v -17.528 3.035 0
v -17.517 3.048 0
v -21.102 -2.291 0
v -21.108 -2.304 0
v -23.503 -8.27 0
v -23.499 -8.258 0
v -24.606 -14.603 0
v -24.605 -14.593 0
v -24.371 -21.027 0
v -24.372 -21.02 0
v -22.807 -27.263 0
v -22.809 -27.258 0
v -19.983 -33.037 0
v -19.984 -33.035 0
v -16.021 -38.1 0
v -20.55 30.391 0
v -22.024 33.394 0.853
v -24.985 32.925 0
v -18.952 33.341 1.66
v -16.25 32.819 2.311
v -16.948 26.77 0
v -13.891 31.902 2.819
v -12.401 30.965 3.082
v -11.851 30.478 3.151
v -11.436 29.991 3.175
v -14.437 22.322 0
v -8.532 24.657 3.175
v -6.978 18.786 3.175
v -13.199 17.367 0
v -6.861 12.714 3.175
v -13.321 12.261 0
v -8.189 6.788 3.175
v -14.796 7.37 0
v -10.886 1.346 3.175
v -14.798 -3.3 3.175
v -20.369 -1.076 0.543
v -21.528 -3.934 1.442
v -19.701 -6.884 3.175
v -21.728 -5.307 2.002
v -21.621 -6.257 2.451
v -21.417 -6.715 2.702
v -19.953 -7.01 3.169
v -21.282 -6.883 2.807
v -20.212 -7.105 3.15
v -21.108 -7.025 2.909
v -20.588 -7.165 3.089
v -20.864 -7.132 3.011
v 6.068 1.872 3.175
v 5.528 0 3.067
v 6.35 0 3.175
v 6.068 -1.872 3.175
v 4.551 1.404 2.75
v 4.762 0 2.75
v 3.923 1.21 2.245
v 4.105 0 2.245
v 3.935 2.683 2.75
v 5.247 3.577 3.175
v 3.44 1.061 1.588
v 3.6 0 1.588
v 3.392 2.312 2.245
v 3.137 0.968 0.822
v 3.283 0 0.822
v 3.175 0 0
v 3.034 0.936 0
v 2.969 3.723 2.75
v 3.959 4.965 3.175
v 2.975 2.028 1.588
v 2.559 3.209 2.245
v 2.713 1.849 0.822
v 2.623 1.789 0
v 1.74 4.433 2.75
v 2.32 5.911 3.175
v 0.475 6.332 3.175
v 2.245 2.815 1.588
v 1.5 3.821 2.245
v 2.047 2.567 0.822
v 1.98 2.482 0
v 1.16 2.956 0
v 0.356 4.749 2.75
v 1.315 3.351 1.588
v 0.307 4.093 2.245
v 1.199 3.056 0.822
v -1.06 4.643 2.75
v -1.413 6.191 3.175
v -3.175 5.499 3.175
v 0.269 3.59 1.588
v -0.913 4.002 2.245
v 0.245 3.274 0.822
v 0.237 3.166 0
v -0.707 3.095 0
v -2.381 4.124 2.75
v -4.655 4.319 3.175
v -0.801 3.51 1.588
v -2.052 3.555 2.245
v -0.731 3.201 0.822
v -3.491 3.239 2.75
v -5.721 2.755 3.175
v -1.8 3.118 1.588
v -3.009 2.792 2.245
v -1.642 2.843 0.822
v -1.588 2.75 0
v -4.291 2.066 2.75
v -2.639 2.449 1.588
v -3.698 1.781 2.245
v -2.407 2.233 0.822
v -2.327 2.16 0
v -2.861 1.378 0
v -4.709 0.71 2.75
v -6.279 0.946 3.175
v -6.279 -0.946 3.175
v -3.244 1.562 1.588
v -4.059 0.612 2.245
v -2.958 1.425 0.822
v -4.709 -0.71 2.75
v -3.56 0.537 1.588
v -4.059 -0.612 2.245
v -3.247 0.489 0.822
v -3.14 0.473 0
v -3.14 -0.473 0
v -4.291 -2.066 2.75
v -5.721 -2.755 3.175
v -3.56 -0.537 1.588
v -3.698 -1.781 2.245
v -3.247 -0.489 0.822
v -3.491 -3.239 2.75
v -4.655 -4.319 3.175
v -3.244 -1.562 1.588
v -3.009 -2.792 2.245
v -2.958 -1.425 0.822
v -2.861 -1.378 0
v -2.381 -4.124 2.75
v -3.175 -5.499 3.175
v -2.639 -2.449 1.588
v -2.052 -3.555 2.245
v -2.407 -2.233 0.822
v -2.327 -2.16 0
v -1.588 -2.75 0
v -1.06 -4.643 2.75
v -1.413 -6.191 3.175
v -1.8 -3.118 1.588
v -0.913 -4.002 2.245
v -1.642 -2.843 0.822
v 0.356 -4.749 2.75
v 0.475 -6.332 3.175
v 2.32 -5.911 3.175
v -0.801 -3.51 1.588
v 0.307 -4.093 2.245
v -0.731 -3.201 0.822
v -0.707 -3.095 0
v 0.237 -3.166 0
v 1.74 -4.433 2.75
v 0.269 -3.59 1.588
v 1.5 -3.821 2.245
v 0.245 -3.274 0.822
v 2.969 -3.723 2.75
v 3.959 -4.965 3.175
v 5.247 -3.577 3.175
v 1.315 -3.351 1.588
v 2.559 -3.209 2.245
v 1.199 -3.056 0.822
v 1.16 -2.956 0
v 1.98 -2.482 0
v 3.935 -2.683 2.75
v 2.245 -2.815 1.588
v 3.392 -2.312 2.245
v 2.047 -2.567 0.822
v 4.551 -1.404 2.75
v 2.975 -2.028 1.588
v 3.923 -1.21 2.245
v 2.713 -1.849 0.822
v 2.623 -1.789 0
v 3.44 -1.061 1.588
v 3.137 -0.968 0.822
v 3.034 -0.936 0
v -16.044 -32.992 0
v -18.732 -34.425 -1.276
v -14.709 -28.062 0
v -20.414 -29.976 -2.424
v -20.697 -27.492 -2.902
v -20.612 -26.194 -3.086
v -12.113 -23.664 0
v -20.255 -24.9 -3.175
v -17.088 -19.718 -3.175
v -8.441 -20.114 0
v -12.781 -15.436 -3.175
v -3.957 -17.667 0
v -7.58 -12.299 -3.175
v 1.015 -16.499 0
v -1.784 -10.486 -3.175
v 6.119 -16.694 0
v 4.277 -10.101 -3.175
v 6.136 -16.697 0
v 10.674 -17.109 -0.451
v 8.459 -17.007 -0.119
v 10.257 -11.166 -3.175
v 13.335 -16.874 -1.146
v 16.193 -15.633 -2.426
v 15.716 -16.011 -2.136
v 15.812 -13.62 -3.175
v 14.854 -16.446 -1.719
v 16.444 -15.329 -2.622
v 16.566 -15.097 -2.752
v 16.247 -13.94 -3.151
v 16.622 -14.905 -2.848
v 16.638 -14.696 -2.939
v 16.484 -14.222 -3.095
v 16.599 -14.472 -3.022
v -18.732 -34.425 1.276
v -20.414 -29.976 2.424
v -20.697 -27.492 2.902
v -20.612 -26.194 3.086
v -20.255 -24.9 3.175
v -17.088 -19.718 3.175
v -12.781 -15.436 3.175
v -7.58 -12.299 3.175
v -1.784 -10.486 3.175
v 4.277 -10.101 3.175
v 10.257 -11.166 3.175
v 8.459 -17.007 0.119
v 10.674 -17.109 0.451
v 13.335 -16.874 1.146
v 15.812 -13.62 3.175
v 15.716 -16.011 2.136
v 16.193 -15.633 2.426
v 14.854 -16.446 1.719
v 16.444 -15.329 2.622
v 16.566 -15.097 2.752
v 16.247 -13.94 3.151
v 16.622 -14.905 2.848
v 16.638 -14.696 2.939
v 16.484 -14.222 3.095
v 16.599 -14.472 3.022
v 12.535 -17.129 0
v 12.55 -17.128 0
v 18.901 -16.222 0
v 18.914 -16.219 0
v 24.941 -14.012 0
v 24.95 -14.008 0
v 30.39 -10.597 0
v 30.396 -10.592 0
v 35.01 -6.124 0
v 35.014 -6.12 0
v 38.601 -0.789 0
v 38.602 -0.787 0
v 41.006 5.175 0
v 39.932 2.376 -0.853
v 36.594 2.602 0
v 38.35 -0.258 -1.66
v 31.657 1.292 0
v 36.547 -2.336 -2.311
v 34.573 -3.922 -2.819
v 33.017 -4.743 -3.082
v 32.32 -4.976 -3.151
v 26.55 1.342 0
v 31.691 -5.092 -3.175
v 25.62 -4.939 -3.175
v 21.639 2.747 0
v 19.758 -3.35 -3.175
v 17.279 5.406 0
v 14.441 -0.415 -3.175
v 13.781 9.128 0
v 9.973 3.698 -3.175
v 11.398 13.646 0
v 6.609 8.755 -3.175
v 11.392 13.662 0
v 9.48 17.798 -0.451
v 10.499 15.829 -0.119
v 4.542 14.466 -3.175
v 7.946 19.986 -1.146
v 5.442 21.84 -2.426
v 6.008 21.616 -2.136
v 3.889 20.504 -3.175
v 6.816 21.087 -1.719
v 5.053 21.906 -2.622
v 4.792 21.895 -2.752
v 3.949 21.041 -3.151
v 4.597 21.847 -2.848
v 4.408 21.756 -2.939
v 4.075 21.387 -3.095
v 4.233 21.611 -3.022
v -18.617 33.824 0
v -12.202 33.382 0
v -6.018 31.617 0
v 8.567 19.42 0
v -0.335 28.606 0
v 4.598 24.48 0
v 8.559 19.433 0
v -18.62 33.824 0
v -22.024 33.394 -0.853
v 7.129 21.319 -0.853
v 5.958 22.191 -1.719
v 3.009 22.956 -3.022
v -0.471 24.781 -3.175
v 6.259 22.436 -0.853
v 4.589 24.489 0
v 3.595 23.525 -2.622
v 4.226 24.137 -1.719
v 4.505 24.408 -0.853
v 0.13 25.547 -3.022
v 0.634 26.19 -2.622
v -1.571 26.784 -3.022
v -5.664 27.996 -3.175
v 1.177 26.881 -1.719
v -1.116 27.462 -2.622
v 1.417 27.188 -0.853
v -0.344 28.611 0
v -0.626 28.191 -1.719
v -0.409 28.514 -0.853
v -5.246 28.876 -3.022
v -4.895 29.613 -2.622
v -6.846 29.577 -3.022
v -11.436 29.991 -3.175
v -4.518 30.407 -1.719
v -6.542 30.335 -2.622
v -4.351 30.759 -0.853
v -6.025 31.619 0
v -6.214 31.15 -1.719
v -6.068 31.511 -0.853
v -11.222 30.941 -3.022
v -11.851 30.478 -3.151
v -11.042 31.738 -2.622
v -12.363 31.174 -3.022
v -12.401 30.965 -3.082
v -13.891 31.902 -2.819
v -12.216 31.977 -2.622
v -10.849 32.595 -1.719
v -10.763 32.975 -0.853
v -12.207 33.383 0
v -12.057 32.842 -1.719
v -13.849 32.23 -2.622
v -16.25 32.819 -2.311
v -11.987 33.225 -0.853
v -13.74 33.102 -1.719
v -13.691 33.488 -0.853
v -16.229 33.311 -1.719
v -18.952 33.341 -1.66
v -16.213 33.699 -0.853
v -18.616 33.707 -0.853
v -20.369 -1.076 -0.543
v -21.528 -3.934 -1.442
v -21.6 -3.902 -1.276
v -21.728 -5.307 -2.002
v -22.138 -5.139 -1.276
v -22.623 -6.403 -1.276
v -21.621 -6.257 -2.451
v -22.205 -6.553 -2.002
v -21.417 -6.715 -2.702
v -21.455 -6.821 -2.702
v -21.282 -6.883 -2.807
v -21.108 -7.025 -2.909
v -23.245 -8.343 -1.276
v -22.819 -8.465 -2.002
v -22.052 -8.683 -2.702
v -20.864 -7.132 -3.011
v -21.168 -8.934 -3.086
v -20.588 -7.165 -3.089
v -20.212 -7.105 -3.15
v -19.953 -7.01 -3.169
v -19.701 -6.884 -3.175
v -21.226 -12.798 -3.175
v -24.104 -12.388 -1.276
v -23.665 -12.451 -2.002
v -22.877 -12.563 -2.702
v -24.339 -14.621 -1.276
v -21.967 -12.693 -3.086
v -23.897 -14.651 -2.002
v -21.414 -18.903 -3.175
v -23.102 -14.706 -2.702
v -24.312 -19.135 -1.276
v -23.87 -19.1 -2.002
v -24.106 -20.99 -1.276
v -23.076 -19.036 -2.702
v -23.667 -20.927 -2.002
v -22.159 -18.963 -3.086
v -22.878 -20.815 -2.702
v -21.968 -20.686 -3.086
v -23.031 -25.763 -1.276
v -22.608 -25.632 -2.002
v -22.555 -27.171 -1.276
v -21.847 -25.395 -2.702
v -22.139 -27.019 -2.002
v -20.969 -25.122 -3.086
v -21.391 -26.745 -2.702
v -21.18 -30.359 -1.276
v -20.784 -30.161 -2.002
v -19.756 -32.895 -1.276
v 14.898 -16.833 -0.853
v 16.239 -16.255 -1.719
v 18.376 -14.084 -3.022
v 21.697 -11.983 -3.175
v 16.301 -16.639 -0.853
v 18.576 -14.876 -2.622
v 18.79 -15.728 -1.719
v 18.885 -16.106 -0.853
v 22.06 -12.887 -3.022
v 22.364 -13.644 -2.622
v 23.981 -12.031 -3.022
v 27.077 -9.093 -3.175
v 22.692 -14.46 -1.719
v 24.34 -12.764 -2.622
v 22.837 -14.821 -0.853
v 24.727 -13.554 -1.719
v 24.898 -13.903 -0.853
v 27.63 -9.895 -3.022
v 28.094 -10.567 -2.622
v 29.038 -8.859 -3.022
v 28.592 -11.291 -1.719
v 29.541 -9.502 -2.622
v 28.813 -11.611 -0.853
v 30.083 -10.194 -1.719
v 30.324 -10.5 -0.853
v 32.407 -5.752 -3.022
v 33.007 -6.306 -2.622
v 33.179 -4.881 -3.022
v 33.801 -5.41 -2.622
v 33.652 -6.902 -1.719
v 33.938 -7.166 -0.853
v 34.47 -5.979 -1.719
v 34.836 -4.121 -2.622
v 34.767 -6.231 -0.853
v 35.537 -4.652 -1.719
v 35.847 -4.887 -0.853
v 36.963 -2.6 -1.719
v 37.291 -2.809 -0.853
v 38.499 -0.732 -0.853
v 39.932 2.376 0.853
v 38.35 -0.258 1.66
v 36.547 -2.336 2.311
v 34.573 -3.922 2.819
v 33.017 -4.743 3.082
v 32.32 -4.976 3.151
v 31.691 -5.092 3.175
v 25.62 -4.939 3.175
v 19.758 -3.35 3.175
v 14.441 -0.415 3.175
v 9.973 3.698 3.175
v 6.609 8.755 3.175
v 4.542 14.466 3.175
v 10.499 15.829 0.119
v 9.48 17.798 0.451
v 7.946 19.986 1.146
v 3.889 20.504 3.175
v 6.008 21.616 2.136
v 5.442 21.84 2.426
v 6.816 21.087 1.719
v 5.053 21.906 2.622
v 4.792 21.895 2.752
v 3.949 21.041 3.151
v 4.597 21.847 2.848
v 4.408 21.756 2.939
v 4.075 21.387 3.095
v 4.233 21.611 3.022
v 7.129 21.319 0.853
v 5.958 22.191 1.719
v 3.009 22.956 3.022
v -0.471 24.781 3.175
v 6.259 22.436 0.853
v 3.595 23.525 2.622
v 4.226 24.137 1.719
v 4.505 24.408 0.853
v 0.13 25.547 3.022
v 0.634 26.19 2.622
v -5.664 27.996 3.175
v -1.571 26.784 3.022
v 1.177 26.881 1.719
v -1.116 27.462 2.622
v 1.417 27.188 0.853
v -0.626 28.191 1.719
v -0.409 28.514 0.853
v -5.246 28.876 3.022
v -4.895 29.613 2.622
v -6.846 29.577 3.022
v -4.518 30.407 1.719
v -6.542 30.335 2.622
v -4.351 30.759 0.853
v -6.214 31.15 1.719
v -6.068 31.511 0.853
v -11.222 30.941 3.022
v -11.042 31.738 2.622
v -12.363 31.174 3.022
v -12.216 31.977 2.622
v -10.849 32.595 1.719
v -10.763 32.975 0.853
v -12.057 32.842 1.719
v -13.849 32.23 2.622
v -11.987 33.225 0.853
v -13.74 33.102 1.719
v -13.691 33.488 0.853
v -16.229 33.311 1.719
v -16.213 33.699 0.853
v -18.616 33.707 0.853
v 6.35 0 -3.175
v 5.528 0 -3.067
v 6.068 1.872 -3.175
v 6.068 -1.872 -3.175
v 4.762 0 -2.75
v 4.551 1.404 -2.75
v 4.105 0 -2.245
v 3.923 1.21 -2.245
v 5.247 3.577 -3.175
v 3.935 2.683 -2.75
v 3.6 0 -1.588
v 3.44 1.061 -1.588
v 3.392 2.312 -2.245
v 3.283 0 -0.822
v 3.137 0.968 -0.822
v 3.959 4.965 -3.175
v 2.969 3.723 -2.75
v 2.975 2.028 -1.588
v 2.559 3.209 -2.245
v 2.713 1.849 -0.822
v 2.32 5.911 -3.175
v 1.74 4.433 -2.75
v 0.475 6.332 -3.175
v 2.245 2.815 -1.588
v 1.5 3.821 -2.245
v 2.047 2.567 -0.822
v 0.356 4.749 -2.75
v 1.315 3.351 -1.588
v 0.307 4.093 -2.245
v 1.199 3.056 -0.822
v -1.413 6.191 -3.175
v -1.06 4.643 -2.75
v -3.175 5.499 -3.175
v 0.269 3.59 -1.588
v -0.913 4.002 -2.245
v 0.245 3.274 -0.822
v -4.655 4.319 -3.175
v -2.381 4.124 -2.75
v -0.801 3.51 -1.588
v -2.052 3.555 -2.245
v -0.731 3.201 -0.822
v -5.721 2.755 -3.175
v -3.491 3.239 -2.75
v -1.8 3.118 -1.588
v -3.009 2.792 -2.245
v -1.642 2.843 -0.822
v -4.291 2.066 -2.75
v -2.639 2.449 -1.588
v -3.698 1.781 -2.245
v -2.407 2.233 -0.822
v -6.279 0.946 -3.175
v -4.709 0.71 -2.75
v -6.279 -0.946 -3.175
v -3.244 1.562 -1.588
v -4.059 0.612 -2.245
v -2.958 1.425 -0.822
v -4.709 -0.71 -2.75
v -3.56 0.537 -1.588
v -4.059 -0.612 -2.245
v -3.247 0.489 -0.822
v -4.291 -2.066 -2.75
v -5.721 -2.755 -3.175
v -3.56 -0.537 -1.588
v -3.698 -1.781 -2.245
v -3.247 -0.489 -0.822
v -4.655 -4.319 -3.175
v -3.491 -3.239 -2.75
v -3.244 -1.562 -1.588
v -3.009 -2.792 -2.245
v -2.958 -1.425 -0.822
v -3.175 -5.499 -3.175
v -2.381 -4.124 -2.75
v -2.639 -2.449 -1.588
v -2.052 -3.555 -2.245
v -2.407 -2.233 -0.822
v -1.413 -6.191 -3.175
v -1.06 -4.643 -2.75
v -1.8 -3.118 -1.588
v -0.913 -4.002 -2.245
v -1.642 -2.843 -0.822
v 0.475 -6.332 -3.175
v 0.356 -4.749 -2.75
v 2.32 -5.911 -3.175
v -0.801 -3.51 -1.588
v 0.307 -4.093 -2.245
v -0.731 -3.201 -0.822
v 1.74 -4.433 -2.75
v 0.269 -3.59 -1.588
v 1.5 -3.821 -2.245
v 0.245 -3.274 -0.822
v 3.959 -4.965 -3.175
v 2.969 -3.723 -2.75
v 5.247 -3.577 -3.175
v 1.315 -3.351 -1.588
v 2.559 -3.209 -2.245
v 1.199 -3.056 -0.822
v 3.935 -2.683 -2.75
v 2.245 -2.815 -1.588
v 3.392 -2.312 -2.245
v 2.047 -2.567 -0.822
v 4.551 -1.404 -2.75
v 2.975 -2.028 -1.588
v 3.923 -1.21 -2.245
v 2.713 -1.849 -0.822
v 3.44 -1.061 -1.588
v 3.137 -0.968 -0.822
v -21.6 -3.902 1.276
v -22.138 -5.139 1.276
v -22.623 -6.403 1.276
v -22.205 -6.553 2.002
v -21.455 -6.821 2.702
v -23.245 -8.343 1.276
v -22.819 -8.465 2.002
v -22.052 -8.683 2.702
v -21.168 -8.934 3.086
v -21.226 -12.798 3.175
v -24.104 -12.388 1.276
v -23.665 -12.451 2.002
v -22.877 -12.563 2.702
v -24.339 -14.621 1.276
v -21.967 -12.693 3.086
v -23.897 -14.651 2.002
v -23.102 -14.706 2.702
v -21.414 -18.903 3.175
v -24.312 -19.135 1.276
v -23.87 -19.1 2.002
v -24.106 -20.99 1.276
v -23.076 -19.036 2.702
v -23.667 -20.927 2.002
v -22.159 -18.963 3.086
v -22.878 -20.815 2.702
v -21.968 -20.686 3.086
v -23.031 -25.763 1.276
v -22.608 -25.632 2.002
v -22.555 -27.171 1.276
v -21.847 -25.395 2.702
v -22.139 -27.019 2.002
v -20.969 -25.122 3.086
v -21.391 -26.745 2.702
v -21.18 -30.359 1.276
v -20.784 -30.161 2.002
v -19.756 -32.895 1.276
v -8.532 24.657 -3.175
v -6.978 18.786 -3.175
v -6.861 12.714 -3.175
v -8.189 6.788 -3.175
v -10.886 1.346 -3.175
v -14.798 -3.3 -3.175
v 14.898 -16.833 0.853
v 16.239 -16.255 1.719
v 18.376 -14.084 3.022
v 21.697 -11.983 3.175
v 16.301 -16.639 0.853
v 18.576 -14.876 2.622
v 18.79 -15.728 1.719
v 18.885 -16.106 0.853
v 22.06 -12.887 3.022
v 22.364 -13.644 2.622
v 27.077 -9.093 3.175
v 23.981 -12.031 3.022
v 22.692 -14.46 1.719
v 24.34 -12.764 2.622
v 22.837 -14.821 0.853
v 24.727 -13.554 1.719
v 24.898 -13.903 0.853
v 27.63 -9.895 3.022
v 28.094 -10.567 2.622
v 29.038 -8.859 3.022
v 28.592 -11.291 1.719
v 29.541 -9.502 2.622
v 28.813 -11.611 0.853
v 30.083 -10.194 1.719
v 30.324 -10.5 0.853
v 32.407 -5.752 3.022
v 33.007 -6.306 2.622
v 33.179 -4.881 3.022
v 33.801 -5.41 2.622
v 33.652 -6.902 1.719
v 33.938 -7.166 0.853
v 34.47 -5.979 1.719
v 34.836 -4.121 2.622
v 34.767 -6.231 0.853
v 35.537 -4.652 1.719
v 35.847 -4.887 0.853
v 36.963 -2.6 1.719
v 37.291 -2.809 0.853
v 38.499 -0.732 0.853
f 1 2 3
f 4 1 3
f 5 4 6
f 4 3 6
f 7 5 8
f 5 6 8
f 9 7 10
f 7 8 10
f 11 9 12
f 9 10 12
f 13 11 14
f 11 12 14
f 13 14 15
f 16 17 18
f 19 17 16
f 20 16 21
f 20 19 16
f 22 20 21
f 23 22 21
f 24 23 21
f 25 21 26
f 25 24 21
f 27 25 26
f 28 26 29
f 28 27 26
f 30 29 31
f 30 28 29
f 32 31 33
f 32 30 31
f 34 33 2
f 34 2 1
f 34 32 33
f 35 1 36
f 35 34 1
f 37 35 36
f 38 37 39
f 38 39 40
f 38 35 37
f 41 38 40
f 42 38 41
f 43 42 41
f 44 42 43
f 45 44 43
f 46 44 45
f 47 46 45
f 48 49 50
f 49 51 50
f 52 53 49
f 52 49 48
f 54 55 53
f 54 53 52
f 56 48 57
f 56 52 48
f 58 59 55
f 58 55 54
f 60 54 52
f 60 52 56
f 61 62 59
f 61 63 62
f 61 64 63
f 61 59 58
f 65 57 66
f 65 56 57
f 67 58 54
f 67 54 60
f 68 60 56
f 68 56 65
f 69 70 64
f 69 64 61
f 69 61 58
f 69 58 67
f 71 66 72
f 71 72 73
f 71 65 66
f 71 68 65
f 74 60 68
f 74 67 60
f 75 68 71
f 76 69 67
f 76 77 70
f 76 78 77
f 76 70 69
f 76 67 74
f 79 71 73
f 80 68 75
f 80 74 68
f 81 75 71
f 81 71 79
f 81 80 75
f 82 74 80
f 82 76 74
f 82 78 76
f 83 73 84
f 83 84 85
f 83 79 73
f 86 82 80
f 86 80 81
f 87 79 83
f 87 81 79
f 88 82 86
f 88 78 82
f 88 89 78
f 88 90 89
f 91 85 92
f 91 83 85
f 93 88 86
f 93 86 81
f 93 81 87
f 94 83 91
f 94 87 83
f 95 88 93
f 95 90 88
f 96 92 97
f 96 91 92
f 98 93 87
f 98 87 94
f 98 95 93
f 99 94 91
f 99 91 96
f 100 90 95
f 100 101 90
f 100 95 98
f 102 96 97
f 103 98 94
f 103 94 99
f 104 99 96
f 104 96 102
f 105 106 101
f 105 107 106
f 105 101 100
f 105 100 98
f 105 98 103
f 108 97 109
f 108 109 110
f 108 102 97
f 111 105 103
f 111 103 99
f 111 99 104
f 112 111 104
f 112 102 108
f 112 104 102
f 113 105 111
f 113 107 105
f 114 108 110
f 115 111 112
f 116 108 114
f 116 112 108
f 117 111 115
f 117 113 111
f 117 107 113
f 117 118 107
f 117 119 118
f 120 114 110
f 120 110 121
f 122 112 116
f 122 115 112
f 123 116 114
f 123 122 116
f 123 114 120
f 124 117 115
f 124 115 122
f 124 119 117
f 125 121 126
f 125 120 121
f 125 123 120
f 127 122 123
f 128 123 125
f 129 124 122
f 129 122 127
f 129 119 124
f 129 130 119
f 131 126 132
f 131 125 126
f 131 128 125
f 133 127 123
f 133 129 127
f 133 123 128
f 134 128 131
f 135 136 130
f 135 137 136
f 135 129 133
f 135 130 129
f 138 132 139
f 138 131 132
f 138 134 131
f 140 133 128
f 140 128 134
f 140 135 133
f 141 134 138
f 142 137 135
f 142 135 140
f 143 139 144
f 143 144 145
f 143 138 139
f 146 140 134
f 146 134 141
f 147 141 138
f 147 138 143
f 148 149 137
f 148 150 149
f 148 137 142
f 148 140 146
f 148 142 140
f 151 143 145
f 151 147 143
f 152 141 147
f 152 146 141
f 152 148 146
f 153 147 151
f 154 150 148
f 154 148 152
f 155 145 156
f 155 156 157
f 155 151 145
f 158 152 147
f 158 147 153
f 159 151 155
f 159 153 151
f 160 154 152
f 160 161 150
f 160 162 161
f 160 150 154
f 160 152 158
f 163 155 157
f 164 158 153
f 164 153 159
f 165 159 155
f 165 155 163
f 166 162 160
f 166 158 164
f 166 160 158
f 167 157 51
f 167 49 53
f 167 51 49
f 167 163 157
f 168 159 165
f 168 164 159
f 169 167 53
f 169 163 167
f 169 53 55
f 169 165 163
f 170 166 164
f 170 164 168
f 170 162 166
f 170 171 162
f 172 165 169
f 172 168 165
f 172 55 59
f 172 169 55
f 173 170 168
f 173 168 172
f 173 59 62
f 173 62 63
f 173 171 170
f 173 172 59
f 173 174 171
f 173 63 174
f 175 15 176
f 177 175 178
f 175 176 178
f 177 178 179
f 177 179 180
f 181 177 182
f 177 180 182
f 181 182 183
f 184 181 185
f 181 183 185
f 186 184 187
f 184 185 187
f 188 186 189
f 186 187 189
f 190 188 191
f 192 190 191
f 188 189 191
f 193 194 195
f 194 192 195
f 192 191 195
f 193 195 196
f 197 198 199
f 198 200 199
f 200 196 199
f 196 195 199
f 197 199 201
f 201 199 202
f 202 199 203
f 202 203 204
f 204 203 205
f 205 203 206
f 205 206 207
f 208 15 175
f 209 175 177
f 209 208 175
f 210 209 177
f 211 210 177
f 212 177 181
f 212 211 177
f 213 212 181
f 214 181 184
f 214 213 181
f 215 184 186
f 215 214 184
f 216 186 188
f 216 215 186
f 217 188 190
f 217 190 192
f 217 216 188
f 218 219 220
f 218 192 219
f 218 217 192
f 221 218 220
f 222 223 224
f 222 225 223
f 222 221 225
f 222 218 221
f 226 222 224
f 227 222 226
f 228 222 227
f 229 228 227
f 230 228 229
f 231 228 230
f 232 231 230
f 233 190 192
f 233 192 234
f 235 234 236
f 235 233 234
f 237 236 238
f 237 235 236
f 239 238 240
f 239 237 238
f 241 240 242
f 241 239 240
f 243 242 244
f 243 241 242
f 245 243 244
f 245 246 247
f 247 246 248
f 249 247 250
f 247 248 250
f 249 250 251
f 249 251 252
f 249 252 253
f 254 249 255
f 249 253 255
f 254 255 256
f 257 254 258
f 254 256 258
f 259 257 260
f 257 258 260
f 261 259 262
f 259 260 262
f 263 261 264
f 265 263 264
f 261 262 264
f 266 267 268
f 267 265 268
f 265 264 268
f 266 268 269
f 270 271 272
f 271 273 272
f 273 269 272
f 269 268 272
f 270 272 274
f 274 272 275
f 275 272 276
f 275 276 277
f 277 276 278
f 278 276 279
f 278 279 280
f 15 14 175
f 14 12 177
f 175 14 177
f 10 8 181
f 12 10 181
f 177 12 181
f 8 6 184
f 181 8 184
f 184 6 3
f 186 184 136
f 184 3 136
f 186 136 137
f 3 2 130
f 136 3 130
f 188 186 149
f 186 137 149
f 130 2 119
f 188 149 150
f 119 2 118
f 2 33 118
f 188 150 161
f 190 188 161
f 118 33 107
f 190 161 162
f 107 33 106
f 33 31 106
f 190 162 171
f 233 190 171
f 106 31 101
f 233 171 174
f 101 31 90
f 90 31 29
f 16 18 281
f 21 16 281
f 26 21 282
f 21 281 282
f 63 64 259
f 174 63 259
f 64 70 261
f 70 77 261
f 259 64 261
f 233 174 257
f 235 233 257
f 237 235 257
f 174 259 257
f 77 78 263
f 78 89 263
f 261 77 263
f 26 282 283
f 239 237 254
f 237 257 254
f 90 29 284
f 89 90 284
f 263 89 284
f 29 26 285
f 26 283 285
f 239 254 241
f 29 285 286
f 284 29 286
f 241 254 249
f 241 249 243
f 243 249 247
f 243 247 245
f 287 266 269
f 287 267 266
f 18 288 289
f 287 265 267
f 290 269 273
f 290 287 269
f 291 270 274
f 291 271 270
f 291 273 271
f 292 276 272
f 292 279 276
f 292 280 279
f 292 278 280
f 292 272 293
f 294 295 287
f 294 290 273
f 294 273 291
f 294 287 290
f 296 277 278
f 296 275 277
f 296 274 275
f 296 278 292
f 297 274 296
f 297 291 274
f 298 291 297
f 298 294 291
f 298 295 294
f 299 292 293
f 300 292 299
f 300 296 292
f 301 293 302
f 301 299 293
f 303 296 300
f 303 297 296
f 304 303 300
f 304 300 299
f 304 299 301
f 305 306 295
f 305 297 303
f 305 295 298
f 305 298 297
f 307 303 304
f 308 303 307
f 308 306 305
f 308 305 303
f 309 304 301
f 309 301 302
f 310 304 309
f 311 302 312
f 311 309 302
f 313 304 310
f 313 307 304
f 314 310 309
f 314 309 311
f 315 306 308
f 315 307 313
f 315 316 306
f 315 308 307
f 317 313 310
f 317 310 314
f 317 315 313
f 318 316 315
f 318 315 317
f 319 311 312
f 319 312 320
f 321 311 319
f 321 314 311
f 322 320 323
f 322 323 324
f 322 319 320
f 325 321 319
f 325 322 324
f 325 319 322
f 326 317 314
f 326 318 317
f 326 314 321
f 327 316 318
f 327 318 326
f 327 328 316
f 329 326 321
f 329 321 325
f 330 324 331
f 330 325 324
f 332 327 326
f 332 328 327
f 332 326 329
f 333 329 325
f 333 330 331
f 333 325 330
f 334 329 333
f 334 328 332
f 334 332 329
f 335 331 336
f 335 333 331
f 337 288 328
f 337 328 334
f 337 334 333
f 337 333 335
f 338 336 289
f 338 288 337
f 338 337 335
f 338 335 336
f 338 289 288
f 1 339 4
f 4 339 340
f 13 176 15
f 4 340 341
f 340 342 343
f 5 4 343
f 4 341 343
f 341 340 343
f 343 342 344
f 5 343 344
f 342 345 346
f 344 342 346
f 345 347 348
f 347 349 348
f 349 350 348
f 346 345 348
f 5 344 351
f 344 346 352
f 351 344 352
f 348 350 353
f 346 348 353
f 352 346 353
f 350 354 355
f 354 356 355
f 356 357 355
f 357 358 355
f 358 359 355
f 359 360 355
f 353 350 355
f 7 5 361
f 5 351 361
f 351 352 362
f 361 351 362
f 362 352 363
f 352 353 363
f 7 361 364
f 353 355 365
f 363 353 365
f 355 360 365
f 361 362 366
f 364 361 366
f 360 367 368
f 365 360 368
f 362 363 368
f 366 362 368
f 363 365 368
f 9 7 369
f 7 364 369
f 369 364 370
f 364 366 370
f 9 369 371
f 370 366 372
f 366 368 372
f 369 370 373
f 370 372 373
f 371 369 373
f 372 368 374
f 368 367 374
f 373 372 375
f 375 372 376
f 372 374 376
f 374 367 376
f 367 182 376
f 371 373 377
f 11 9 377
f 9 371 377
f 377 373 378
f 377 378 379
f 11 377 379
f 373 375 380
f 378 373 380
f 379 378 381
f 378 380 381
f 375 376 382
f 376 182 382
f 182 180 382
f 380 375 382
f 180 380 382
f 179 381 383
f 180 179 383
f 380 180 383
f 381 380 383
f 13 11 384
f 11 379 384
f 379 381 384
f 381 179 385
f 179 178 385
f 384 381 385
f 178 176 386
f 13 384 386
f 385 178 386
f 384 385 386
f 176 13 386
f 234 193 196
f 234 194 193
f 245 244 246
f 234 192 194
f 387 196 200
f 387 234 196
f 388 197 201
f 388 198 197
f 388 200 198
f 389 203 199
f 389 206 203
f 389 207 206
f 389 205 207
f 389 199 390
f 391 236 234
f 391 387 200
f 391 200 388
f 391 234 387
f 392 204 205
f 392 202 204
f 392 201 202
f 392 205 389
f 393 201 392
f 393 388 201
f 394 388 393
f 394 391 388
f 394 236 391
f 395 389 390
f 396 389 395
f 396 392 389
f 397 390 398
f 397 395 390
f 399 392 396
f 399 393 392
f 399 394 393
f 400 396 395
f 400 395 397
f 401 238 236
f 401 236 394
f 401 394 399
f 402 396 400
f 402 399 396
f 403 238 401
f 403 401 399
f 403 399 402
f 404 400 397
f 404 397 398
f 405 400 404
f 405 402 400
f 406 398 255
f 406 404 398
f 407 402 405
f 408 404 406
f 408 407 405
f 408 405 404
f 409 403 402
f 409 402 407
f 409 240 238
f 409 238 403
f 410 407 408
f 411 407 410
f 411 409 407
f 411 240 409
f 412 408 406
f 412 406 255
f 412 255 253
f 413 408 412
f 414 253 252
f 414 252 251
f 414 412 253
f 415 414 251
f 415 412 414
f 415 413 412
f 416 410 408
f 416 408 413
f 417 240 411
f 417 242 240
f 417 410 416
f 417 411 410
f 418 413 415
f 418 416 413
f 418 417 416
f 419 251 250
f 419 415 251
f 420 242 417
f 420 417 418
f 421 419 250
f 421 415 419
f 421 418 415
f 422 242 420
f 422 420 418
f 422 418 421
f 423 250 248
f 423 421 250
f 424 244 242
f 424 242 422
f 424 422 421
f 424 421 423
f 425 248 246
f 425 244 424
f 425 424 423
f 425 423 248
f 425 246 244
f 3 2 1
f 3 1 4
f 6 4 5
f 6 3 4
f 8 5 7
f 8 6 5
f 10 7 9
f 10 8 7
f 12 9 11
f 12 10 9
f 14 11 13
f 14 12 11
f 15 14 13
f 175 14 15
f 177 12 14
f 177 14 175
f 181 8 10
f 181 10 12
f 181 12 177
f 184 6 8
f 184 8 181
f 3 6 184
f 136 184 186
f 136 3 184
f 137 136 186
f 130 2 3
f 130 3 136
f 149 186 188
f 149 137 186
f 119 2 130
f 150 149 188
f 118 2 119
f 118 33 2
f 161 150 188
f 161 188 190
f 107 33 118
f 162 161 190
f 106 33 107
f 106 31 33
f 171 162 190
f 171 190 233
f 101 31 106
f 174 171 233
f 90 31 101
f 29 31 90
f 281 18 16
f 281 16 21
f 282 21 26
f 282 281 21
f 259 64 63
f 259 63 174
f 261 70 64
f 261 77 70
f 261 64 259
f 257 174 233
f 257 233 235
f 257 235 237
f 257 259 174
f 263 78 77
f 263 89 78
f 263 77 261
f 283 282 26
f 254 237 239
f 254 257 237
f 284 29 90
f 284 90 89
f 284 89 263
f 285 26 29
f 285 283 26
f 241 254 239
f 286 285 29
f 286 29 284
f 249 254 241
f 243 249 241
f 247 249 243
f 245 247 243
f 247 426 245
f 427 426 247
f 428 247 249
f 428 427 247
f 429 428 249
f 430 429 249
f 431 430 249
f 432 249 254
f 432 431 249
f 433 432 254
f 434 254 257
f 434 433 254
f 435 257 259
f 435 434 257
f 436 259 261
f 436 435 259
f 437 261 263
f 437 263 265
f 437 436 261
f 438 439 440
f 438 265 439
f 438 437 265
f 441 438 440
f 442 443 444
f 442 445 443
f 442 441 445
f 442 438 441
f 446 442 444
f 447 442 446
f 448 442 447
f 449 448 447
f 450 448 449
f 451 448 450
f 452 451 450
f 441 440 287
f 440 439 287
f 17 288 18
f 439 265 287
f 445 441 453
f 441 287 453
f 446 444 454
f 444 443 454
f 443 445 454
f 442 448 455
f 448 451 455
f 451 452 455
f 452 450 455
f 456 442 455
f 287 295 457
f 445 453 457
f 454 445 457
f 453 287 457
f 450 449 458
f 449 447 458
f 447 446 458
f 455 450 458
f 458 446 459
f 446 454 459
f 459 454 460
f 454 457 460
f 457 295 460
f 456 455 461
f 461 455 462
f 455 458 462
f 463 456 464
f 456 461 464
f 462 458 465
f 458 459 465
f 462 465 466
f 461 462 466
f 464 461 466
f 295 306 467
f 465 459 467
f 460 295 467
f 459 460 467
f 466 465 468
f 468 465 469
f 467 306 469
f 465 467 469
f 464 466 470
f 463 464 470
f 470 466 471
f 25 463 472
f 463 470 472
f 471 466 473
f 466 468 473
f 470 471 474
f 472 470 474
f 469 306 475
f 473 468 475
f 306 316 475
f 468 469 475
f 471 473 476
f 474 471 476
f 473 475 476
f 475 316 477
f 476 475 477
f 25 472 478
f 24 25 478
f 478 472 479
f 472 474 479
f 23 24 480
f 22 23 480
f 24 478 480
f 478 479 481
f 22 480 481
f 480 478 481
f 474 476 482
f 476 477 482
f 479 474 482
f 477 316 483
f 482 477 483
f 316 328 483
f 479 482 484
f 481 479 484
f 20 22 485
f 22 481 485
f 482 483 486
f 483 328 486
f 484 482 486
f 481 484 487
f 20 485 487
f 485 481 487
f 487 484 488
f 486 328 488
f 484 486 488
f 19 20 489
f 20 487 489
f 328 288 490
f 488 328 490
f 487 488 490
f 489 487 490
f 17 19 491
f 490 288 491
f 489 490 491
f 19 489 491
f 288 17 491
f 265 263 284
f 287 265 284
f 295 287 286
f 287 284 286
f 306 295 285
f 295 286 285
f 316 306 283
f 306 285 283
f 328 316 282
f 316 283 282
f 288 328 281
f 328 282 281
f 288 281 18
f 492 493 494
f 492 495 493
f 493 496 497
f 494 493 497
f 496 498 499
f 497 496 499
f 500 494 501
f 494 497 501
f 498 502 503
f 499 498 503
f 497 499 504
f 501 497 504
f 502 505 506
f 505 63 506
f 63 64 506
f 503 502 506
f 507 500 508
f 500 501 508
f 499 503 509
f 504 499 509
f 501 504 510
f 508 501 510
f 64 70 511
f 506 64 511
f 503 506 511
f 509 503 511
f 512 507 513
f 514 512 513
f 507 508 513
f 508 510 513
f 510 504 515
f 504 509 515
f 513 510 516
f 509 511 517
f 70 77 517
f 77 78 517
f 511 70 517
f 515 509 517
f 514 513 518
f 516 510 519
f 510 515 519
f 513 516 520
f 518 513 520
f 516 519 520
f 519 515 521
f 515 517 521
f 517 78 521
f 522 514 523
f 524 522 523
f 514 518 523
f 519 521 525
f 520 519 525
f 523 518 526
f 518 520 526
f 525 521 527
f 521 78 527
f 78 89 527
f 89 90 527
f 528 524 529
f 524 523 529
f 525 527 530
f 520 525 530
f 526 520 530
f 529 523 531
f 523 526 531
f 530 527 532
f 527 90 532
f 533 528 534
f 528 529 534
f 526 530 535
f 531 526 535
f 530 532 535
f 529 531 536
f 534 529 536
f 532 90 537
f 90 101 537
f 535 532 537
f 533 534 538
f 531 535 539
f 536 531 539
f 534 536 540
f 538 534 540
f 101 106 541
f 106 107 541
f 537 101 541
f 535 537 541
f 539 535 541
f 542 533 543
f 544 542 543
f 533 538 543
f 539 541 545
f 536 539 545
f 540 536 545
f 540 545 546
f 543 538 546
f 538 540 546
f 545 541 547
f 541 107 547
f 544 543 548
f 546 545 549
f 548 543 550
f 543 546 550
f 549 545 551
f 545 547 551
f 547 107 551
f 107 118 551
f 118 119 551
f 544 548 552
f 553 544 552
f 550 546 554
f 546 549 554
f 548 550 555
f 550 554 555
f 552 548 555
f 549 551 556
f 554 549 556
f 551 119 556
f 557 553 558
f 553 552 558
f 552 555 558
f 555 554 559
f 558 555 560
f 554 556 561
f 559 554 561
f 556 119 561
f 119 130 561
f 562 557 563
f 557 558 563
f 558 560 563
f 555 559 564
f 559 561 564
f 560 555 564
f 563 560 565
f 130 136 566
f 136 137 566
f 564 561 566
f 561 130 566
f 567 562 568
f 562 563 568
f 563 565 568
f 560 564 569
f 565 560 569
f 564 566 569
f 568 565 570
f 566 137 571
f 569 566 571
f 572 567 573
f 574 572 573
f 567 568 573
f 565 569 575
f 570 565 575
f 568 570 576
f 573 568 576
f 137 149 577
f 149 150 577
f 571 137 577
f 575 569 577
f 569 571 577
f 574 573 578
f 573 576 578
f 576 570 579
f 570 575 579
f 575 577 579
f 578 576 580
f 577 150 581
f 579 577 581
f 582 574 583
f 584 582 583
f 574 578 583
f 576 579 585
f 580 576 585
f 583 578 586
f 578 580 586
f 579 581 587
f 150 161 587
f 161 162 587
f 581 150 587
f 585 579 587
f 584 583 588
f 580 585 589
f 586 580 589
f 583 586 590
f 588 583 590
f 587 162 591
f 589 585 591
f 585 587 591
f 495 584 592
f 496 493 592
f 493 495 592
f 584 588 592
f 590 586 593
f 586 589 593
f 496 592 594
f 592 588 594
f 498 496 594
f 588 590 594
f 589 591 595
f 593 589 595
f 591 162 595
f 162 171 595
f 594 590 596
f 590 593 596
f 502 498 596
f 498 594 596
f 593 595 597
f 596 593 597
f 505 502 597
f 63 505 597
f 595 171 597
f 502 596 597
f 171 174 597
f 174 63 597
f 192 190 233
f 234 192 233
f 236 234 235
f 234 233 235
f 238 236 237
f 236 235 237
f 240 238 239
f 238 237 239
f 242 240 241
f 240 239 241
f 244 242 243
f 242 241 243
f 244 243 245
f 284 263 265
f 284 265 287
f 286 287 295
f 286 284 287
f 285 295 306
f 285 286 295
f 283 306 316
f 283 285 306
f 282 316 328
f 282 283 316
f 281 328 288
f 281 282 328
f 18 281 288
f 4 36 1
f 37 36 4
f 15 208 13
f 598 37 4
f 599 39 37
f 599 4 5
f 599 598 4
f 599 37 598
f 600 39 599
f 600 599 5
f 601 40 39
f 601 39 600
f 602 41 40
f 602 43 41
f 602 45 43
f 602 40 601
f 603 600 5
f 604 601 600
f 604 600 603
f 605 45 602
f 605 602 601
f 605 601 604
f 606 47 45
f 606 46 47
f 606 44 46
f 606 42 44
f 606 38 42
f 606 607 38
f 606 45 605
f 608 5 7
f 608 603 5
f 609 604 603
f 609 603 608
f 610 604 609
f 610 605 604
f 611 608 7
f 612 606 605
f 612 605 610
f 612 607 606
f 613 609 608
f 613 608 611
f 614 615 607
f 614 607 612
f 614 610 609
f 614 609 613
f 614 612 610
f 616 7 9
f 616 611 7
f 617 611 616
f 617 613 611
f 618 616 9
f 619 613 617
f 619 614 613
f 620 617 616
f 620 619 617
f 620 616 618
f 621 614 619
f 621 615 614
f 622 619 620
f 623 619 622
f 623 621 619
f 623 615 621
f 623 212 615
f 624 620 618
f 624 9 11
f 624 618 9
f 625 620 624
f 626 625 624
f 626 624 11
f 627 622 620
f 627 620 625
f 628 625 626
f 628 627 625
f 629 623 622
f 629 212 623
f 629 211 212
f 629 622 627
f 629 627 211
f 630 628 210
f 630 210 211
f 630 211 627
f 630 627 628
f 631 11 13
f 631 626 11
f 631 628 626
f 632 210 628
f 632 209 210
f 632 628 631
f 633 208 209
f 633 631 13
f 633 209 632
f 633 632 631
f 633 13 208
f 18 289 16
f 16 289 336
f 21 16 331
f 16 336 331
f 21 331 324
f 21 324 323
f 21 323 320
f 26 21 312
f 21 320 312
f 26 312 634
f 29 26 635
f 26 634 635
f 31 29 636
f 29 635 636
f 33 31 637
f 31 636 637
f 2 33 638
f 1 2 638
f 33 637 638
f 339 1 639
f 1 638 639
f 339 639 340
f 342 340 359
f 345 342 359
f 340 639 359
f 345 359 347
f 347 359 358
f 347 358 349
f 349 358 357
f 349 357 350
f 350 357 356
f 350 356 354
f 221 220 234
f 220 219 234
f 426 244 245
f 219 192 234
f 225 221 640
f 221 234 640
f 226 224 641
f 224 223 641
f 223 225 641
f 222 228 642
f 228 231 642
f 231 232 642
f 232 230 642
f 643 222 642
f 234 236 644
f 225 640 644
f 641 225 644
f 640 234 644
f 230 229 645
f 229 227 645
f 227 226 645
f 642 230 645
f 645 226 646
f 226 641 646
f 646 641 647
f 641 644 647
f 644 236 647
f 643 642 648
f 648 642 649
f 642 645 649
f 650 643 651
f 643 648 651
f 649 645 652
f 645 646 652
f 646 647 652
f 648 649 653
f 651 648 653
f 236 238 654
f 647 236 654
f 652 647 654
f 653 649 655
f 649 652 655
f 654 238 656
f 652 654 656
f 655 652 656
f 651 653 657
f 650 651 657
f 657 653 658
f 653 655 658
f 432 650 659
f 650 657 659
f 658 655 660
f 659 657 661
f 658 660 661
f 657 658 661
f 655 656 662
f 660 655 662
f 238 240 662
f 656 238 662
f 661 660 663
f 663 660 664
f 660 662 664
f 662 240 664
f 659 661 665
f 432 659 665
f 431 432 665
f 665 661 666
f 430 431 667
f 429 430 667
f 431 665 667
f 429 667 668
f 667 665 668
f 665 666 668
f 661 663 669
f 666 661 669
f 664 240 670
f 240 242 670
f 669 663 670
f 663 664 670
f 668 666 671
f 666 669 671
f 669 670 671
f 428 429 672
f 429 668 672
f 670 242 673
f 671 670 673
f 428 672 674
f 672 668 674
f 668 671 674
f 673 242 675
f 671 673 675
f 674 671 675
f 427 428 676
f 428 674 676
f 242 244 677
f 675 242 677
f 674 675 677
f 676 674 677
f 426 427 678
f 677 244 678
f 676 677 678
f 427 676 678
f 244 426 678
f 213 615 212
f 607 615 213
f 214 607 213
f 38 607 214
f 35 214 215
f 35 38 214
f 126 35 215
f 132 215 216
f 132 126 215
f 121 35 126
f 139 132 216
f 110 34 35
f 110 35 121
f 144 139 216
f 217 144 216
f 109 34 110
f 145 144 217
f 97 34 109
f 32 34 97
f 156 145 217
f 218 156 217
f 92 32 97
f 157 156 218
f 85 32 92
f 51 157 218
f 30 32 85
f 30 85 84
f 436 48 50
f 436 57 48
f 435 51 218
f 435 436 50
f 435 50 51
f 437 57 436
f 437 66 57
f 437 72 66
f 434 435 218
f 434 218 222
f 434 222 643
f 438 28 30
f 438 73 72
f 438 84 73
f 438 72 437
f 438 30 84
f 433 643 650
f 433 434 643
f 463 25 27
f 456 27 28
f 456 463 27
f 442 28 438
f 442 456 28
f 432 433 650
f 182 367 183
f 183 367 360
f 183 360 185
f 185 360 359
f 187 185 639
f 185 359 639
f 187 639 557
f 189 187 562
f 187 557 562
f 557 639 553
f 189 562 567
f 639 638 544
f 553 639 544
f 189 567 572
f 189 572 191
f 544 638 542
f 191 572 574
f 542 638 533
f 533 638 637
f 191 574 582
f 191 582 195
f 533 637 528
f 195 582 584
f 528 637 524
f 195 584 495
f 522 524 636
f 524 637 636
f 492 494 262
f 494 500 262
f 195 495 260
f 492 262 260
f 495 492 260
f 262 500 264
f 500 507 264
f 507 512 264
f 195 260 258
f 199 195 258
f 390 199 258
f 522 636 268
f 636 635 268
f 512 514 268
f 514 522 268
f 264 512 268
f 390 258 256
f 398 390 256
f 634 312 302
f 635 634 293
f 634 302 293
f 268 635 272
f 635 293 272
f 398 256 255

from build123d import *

# Parameters (mm, degrees)
F0_R        = 3.175
F1_DEPTH    = 3.175
F2_T2_ANGLE = 206.8397195509
F2_T4_ANGLE = 206.8397195509
F2_T6_ANGLE = 206.8397195509
F3_R        = 3.17499


# Not quite as in the source:
# - a fillet or chamfer that OpenCascade refuses, or shapes differently, is made with other operations: its cross-section is extruded or revolved along the edge and cut away or added
# - a fillet or chamfer is up to 0.001 mm smaller than in the source, because OpenCascade refuses the exact size


with BuildPart() as f1:
    # F0 (on Top) → F1 (new body)
    with BuildSketch(Plane.XY):
        with BuildLine():
            Line((6.1187519112, -16.6939891892), (-17.516794684, 3.048))
            ThreePointArc((-17.516794684, 3.048), (-24.6567837547, -17.812740491), (-16.0209838859, -38.1))
            ThreePointArc((-16.0209838859, -38.1), (-10.3962463249, -21.7652237747), (6.1187519112, -16.6939891892))
        make_face()
        with BuildLine():
            ThreePointArc((41.0060598271, 5.1754209612), (24.0473598704, 1.879198466), (11.3980427727, 13.6459891892))
            Line((11.3980427727, 13.6459891892), (6.1187519112, -16.6939891892))
            ThreePointArc((6.1187519112, -16.6939891892), (27.7546776535, -12.4470308617), (41.0060598271, 5.1754209612))
        make_face()
        with BuildLine():
            ThreePointArc((-24.9850759412, 32.9245790388), (-13.6511135455, 19.8860253087), (-17.516794684, 3.048))
            Line((-17.516794684, 3.048), (11.3980427727, 13.6459891892))
            ThreePointArc((11.3980427727, 13.6459891892), (-3.0978938988, 30.2597713527), (-24.9850759412, 32.9245790388))
        make_face()
        Polygon((11.3980427727, 13.6459891892), (-17.516794684, 3.048), (6.1187519112, -16.6939891892), align=None)
        Circle(F0_R, mode=Mode.SUBTRACT)
    extrude(amount=F1_DEPTH)

    # F2: chamfer of 3.175 x 6.35 on 3 edges, made by hand

    # F2_s1 → F2_t2 (revolve, cut)
    with BuildSketch(Plane(origin=(0.9537550873, 21.4539943341, 0), x_dir=(0, 0, 1), z_dir=(0.0444119638, 0.999013302, 0))):
        Polygon((0, 47.4113941081), (3.175, 53.7613941081), (3.175, 47.4113941081), align=None)
    revolve(axis=Axis((29.2871650632, 20.1944091266, 3.175), (0, 0, -1)), revolution_arc=F2_T2_ANGLE, mode=Mode.SUBTRACT)

    # F2_s3 → F2_t4 (revolve, cut)
    with BuildSketch(Plane(origin=(-19.0565816496, -9.9010210324, 0), x_dir=(0, 0, 1), z_dir=(-0.8873768801, -0.4610447621, 0))):
        Polygon((0, 47.4113941081), (3.175, 53.7613941081), (3.175, 47.4113941081), align=None)
    revolve(axis=Axis((-32.1324538496, 15.2662243863, 3.175), (0, 0, -1)), revolution_arc=F2_T4_ANGLE, mode=Mode.SUBTRACT)

    # F2_s5 → F2_t6 (revolve, cut)
    with BuildSketch(Plane(origin=(18.1028265623, -11.5529733017, 0), x_dir=(0, 0, 1), z_dir=(0.8429649163, -0.5379685398, 0))):
        Polygon((0, 47.4113941081), (3.175, 53.7613941081), (3.175, 47.4113941081), align=None)
    revolve(axis=Axis((2.8452887864, -35.4606335128, 3.175), (0, 0, -1)), revolution_arc=F2_T6_ANGLE, mode=Mode.SUBTRACT)

    # F3 (radius 3.175 in the source; OpenCascade refuses exactly that, so slightly less here)
    f3_edges = [f1.edges().sort_by_distance(p)[0] for p in [
        (-4.399333, 30.910473, 3.175),
        (28.968921, -11.645302, 3.175),
        (-24.569588, -19.26517, 3.175),
        (-3.175, 0, 3.175),
    ]]
    fillet(f3_edges, radius=F3_R)


with BuildPart() as f4_1:
    # F4: instance of F1
    add(f1.part.mirror(Plane(origin=(0, 0, 0), x_dir=(1, 0, 0), z_dir=(0, 0, -1))))


solid = Compound([f1.part, f4_1.part])
